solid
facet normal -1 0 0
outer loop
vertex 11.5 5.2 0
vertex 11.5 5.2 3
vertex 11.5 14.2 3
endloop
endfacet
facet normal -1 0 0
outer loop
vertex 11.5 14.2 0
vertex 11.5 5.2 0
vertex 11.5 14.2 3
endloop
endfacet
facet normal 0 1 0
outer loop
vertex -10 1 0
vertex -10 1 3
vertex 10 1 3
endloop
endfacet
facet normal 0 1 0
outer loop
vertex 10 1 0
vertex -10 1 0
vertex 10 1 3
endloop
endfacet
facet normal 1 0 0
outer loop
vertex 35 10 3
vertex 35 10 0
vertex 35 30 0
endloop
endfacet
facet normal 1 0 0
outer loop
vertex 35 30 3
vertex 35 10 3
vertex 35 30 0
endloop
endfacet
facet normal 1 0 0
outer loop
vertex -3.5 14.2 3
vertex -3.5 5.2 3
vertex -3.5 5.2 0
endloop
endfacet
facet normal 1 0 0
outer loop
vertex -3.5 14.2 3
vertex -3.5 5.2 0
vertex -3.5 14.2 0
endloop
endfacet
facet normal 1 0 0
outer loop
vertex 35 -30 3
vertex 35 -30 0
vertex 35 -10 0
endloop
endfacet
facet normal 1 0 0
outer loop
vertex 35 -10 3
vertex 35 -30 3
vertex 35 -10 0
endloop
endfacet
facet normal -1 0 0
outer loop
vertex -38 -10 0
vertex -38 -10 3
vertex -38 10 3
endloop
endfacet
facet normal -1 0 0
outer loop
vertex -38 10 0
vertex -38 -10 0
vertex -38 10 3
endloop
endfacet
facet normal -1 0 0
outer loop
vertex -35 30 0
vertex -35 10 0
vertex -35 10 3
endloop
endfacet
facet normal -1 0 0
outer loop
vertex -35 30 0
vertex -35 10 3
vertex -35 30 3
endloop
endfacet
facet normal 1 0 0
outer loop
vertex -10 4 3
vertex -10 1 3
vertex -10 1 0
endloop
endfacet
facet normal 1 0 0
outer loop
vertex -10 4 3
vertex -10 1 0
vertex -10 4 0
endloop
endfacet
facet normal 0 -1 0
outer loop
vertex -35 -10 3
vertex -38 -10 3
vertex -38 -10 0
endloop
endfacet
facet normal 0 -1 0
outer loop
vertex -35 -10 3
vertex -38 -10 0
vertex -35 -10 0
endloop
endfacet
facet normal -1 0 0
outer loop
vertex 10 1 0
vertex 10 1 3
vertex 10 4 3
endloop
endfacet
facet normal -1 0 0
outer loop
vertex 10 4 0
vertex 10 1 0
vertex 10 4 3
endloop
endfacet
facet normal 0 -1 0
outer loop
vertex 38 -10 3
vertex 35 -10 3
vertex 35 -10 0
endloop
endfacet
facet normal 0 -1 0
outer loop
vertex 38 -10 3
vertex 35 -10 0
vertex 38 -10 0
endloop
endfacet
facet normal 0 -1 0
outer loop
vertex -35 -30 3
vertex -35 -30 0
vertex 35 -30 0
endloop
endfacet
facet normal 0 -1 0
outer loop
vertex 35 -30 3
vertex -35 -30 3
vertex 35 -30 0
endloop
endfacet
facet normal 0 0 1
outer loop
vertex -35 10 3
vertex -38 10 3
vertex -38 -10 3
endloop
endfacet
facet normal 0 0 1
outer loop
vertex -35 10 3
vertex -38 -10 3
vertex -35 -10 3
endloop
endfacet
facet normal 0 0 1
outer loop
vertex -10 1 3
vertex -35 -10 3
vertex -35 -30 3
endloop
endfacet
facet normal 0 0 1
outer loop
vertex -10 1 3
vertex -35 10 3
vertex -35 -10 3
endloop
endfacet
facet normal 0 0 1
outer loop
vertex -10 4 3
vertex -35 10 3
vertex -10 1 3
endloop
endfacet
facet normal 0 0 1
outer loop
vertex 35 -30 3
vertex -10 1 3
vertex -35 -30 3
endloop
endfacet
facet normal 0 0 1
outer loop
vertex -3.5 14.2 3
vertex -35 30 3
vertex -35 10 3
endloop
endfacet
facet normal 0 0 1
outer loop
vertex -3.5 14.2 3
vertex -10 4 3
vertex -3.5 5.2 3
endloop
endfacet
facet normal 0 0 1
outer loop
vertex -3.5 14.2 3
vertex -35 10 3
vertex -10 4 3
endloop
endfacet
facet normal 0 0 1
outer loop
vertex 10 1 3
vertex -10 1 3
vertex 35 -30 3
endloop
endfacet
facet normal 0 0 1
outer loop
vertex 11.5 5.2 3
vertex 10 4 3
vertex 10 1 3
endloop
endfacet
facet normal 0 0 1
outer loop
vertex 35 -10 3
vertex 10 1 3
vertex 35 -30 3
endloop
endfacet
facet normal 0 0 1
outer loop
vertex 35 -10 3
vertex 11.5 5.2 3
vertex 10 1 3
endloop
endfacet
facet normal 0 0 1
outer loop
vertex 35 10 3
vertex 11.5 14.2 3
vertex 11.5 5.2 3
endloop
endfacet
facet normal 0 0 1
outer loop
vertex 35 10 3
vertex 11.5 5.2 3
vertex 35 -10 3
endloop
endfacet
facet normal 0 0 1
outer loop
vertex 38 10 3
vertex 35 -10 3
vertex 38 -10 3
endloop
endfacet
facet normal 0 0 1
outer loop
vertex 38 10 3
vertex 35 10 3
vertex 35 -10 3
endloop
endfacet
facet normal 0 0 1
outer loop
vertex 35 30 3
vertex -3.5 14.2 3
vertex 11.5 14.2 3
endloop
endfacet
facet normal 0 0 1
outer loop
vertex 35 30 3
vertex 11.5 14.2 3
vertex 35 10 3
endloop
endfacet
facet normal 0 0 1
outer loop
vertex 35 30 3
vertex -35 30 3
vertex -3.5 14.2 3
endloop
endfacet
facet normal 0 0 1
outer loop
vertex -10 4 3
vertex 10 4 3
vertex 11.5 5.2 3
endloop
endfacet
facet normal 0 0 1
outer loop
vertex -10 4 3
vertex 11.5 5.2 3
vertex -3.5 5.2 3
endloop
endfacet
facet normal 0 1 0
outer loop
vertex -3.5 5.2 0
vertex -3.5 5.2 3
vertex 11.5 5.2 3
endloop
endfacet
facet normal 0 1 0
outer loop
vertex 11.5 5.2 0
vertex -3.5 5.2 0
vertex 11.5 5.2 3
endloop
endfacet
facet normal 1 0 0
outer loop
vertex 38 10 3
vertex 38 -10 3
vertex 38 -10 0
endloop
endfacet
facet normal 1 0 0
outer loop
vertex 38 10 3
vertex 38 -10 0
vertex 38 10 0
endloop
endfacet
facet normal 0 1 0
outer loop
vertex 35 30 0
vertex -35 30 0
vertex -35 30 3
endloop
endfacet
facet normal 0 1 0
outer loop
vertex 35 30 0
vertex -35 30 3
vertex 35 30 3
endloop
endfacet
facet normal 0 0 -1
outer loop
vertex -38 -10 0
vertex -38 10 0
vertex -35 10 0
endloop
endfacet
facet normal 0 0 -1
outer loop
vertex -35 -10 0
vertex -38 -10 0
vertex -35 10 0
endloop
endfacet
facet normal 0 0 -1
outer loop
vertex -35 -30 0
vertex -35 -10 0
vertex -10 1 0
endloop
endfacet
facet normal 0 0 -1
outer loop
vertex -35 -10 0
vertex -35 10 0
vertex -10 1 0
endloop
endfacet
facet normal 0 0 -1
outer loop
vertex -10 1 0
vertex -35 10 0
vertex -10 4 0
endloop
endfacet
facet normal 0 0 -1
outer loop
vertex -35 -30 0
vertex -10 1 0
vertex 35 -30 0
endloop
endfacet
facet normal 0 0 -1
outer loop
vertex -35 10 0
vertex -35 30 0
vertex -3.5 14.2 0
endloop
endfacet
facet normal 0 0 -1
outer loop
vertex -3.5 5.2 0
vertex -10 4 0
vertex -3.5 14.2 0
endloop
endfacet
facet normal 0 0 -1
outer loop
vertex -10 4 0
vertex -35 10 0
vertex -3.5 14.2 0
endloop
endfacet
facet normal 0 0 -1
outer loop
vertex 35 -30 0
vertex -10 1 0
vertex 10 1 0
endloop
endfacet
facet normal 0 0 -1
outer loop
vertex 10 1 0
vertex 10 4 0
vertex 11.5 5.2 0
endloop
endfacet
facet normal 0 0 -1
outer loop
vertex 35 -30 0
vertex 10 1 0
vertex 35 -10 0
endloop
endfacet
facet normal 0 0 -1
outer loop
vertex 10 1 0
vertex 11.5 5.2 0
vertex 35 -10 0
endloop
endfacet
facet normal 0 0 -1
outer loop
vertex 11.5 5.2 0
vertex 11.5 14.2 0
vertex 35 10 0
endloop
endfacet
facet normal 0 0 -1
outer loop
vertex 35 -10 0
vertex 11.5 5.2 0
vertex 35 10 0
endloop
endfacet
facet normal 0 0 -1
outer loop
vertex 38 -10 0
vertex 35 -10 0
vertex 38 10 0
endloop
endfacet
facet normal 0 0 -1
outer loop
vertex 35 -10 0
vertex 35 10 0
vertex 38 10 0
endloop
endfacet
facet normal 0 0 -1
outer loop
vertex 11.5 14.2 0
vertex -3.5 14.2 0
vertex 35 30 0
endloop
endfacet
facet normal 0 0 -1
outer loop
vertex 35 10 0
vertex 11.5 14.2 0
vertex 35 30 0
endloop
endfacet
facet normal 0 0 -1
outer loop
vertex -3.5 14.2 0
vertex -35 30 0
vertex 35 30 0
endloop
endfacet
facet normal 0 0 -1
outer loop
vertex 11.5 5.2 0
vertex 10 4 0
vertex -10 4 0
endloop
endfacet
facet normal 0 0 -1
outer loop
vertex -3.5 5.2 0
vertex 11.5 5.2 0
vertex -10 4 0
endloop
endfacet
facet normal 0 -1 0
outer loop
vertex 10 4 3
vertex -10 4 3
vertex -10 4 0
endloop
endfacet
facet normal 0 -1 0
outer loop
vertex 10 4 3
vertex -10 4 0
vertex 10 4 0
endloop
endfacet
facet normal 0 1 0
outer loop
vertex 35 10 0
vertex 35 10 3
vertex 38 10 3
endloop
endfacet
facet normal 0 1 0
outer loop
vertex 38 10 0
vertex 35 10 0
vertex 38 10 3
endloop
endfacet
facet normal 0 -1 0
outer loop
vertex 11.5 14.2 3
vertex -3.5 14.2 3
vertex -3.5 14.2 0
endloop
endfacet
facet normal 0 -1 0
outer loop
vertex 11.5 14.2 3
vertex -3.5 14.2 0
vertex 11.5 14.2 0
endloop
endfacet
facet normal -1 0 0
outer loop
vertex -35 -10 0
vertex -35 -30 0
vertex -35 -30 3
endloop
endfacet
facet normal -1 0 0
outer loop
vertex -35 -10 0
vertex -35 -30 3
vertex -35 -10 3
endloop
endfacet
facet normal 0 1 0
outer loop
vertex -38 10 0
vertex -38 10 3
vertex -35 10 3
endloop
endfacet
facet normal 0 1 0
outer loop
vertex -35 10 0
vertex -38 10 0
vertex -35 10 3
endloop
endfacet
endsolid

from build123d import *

# Parameters (mm, degrees)
SKETCH1_W           = 70
SKETCH1_H           = 60
BOSS_EXTRUDE1_DEPTH = 3
SKETCH2_W           = 15
SKETCH2_H           = 9
CUT_EXTRUDE1_DEPTH  = 3
SKETCH3_W           = 20
SKETCH3_H           = 3
CUT_EXTRUDE2_DEPTH  = 3
SKETCH4_W           = 3
SKETCH4_H           = 20
BOSS_EXTRUDE2_DEPTH = 3


with BuildPart() as part:
    # Sketch1 → Boss-Extrude1 (new body)
    with BuildSketch(Plane.XY):
        Rectangle(SKETCH1_W, SKETCH1_H)
    extrude(amount=BOSS_EXTRUDE1_DEPTH)

    # Sketch2 → Cut-Extrude1 (cut)
    with BuildSketch(Plane.XY.offset(3)):
        with Locations((4, 9.7)):
            Rectangle(SKETCH2_W, SKETCH2_H)
    extrude(amount=-CUT_EXTRUDE1_DEPTH, mode=Mode.SUBTRACT)

    # Sketch3 → Cut-Extrude2 (cut)
    with BuildSketch(Plane.XY.offset(3)):
        with Locations((0, 2.5)):
            Rectangle(SKETCH3_W, SKETCH3_H)
    extrude(amount=-CUT_EXTRUDE2_DEPTH, mode=Mode.SUBTRACT)

    # Sketch4 → Boss-Extrude2 (add)
    with BuildSketch(Plane.XY.offset(3)):
        with Locations((36.5, 0)):
            Rectangle(SKETCH4_W, SKETCH4_H)
        with Locations((-36.5, 0)):
            Rectangle(SKETCH4_W, SKETCH4_H)
    extrude(amount=-BOSS_EXTRUDE2_DEPTH)


solid = part.part
